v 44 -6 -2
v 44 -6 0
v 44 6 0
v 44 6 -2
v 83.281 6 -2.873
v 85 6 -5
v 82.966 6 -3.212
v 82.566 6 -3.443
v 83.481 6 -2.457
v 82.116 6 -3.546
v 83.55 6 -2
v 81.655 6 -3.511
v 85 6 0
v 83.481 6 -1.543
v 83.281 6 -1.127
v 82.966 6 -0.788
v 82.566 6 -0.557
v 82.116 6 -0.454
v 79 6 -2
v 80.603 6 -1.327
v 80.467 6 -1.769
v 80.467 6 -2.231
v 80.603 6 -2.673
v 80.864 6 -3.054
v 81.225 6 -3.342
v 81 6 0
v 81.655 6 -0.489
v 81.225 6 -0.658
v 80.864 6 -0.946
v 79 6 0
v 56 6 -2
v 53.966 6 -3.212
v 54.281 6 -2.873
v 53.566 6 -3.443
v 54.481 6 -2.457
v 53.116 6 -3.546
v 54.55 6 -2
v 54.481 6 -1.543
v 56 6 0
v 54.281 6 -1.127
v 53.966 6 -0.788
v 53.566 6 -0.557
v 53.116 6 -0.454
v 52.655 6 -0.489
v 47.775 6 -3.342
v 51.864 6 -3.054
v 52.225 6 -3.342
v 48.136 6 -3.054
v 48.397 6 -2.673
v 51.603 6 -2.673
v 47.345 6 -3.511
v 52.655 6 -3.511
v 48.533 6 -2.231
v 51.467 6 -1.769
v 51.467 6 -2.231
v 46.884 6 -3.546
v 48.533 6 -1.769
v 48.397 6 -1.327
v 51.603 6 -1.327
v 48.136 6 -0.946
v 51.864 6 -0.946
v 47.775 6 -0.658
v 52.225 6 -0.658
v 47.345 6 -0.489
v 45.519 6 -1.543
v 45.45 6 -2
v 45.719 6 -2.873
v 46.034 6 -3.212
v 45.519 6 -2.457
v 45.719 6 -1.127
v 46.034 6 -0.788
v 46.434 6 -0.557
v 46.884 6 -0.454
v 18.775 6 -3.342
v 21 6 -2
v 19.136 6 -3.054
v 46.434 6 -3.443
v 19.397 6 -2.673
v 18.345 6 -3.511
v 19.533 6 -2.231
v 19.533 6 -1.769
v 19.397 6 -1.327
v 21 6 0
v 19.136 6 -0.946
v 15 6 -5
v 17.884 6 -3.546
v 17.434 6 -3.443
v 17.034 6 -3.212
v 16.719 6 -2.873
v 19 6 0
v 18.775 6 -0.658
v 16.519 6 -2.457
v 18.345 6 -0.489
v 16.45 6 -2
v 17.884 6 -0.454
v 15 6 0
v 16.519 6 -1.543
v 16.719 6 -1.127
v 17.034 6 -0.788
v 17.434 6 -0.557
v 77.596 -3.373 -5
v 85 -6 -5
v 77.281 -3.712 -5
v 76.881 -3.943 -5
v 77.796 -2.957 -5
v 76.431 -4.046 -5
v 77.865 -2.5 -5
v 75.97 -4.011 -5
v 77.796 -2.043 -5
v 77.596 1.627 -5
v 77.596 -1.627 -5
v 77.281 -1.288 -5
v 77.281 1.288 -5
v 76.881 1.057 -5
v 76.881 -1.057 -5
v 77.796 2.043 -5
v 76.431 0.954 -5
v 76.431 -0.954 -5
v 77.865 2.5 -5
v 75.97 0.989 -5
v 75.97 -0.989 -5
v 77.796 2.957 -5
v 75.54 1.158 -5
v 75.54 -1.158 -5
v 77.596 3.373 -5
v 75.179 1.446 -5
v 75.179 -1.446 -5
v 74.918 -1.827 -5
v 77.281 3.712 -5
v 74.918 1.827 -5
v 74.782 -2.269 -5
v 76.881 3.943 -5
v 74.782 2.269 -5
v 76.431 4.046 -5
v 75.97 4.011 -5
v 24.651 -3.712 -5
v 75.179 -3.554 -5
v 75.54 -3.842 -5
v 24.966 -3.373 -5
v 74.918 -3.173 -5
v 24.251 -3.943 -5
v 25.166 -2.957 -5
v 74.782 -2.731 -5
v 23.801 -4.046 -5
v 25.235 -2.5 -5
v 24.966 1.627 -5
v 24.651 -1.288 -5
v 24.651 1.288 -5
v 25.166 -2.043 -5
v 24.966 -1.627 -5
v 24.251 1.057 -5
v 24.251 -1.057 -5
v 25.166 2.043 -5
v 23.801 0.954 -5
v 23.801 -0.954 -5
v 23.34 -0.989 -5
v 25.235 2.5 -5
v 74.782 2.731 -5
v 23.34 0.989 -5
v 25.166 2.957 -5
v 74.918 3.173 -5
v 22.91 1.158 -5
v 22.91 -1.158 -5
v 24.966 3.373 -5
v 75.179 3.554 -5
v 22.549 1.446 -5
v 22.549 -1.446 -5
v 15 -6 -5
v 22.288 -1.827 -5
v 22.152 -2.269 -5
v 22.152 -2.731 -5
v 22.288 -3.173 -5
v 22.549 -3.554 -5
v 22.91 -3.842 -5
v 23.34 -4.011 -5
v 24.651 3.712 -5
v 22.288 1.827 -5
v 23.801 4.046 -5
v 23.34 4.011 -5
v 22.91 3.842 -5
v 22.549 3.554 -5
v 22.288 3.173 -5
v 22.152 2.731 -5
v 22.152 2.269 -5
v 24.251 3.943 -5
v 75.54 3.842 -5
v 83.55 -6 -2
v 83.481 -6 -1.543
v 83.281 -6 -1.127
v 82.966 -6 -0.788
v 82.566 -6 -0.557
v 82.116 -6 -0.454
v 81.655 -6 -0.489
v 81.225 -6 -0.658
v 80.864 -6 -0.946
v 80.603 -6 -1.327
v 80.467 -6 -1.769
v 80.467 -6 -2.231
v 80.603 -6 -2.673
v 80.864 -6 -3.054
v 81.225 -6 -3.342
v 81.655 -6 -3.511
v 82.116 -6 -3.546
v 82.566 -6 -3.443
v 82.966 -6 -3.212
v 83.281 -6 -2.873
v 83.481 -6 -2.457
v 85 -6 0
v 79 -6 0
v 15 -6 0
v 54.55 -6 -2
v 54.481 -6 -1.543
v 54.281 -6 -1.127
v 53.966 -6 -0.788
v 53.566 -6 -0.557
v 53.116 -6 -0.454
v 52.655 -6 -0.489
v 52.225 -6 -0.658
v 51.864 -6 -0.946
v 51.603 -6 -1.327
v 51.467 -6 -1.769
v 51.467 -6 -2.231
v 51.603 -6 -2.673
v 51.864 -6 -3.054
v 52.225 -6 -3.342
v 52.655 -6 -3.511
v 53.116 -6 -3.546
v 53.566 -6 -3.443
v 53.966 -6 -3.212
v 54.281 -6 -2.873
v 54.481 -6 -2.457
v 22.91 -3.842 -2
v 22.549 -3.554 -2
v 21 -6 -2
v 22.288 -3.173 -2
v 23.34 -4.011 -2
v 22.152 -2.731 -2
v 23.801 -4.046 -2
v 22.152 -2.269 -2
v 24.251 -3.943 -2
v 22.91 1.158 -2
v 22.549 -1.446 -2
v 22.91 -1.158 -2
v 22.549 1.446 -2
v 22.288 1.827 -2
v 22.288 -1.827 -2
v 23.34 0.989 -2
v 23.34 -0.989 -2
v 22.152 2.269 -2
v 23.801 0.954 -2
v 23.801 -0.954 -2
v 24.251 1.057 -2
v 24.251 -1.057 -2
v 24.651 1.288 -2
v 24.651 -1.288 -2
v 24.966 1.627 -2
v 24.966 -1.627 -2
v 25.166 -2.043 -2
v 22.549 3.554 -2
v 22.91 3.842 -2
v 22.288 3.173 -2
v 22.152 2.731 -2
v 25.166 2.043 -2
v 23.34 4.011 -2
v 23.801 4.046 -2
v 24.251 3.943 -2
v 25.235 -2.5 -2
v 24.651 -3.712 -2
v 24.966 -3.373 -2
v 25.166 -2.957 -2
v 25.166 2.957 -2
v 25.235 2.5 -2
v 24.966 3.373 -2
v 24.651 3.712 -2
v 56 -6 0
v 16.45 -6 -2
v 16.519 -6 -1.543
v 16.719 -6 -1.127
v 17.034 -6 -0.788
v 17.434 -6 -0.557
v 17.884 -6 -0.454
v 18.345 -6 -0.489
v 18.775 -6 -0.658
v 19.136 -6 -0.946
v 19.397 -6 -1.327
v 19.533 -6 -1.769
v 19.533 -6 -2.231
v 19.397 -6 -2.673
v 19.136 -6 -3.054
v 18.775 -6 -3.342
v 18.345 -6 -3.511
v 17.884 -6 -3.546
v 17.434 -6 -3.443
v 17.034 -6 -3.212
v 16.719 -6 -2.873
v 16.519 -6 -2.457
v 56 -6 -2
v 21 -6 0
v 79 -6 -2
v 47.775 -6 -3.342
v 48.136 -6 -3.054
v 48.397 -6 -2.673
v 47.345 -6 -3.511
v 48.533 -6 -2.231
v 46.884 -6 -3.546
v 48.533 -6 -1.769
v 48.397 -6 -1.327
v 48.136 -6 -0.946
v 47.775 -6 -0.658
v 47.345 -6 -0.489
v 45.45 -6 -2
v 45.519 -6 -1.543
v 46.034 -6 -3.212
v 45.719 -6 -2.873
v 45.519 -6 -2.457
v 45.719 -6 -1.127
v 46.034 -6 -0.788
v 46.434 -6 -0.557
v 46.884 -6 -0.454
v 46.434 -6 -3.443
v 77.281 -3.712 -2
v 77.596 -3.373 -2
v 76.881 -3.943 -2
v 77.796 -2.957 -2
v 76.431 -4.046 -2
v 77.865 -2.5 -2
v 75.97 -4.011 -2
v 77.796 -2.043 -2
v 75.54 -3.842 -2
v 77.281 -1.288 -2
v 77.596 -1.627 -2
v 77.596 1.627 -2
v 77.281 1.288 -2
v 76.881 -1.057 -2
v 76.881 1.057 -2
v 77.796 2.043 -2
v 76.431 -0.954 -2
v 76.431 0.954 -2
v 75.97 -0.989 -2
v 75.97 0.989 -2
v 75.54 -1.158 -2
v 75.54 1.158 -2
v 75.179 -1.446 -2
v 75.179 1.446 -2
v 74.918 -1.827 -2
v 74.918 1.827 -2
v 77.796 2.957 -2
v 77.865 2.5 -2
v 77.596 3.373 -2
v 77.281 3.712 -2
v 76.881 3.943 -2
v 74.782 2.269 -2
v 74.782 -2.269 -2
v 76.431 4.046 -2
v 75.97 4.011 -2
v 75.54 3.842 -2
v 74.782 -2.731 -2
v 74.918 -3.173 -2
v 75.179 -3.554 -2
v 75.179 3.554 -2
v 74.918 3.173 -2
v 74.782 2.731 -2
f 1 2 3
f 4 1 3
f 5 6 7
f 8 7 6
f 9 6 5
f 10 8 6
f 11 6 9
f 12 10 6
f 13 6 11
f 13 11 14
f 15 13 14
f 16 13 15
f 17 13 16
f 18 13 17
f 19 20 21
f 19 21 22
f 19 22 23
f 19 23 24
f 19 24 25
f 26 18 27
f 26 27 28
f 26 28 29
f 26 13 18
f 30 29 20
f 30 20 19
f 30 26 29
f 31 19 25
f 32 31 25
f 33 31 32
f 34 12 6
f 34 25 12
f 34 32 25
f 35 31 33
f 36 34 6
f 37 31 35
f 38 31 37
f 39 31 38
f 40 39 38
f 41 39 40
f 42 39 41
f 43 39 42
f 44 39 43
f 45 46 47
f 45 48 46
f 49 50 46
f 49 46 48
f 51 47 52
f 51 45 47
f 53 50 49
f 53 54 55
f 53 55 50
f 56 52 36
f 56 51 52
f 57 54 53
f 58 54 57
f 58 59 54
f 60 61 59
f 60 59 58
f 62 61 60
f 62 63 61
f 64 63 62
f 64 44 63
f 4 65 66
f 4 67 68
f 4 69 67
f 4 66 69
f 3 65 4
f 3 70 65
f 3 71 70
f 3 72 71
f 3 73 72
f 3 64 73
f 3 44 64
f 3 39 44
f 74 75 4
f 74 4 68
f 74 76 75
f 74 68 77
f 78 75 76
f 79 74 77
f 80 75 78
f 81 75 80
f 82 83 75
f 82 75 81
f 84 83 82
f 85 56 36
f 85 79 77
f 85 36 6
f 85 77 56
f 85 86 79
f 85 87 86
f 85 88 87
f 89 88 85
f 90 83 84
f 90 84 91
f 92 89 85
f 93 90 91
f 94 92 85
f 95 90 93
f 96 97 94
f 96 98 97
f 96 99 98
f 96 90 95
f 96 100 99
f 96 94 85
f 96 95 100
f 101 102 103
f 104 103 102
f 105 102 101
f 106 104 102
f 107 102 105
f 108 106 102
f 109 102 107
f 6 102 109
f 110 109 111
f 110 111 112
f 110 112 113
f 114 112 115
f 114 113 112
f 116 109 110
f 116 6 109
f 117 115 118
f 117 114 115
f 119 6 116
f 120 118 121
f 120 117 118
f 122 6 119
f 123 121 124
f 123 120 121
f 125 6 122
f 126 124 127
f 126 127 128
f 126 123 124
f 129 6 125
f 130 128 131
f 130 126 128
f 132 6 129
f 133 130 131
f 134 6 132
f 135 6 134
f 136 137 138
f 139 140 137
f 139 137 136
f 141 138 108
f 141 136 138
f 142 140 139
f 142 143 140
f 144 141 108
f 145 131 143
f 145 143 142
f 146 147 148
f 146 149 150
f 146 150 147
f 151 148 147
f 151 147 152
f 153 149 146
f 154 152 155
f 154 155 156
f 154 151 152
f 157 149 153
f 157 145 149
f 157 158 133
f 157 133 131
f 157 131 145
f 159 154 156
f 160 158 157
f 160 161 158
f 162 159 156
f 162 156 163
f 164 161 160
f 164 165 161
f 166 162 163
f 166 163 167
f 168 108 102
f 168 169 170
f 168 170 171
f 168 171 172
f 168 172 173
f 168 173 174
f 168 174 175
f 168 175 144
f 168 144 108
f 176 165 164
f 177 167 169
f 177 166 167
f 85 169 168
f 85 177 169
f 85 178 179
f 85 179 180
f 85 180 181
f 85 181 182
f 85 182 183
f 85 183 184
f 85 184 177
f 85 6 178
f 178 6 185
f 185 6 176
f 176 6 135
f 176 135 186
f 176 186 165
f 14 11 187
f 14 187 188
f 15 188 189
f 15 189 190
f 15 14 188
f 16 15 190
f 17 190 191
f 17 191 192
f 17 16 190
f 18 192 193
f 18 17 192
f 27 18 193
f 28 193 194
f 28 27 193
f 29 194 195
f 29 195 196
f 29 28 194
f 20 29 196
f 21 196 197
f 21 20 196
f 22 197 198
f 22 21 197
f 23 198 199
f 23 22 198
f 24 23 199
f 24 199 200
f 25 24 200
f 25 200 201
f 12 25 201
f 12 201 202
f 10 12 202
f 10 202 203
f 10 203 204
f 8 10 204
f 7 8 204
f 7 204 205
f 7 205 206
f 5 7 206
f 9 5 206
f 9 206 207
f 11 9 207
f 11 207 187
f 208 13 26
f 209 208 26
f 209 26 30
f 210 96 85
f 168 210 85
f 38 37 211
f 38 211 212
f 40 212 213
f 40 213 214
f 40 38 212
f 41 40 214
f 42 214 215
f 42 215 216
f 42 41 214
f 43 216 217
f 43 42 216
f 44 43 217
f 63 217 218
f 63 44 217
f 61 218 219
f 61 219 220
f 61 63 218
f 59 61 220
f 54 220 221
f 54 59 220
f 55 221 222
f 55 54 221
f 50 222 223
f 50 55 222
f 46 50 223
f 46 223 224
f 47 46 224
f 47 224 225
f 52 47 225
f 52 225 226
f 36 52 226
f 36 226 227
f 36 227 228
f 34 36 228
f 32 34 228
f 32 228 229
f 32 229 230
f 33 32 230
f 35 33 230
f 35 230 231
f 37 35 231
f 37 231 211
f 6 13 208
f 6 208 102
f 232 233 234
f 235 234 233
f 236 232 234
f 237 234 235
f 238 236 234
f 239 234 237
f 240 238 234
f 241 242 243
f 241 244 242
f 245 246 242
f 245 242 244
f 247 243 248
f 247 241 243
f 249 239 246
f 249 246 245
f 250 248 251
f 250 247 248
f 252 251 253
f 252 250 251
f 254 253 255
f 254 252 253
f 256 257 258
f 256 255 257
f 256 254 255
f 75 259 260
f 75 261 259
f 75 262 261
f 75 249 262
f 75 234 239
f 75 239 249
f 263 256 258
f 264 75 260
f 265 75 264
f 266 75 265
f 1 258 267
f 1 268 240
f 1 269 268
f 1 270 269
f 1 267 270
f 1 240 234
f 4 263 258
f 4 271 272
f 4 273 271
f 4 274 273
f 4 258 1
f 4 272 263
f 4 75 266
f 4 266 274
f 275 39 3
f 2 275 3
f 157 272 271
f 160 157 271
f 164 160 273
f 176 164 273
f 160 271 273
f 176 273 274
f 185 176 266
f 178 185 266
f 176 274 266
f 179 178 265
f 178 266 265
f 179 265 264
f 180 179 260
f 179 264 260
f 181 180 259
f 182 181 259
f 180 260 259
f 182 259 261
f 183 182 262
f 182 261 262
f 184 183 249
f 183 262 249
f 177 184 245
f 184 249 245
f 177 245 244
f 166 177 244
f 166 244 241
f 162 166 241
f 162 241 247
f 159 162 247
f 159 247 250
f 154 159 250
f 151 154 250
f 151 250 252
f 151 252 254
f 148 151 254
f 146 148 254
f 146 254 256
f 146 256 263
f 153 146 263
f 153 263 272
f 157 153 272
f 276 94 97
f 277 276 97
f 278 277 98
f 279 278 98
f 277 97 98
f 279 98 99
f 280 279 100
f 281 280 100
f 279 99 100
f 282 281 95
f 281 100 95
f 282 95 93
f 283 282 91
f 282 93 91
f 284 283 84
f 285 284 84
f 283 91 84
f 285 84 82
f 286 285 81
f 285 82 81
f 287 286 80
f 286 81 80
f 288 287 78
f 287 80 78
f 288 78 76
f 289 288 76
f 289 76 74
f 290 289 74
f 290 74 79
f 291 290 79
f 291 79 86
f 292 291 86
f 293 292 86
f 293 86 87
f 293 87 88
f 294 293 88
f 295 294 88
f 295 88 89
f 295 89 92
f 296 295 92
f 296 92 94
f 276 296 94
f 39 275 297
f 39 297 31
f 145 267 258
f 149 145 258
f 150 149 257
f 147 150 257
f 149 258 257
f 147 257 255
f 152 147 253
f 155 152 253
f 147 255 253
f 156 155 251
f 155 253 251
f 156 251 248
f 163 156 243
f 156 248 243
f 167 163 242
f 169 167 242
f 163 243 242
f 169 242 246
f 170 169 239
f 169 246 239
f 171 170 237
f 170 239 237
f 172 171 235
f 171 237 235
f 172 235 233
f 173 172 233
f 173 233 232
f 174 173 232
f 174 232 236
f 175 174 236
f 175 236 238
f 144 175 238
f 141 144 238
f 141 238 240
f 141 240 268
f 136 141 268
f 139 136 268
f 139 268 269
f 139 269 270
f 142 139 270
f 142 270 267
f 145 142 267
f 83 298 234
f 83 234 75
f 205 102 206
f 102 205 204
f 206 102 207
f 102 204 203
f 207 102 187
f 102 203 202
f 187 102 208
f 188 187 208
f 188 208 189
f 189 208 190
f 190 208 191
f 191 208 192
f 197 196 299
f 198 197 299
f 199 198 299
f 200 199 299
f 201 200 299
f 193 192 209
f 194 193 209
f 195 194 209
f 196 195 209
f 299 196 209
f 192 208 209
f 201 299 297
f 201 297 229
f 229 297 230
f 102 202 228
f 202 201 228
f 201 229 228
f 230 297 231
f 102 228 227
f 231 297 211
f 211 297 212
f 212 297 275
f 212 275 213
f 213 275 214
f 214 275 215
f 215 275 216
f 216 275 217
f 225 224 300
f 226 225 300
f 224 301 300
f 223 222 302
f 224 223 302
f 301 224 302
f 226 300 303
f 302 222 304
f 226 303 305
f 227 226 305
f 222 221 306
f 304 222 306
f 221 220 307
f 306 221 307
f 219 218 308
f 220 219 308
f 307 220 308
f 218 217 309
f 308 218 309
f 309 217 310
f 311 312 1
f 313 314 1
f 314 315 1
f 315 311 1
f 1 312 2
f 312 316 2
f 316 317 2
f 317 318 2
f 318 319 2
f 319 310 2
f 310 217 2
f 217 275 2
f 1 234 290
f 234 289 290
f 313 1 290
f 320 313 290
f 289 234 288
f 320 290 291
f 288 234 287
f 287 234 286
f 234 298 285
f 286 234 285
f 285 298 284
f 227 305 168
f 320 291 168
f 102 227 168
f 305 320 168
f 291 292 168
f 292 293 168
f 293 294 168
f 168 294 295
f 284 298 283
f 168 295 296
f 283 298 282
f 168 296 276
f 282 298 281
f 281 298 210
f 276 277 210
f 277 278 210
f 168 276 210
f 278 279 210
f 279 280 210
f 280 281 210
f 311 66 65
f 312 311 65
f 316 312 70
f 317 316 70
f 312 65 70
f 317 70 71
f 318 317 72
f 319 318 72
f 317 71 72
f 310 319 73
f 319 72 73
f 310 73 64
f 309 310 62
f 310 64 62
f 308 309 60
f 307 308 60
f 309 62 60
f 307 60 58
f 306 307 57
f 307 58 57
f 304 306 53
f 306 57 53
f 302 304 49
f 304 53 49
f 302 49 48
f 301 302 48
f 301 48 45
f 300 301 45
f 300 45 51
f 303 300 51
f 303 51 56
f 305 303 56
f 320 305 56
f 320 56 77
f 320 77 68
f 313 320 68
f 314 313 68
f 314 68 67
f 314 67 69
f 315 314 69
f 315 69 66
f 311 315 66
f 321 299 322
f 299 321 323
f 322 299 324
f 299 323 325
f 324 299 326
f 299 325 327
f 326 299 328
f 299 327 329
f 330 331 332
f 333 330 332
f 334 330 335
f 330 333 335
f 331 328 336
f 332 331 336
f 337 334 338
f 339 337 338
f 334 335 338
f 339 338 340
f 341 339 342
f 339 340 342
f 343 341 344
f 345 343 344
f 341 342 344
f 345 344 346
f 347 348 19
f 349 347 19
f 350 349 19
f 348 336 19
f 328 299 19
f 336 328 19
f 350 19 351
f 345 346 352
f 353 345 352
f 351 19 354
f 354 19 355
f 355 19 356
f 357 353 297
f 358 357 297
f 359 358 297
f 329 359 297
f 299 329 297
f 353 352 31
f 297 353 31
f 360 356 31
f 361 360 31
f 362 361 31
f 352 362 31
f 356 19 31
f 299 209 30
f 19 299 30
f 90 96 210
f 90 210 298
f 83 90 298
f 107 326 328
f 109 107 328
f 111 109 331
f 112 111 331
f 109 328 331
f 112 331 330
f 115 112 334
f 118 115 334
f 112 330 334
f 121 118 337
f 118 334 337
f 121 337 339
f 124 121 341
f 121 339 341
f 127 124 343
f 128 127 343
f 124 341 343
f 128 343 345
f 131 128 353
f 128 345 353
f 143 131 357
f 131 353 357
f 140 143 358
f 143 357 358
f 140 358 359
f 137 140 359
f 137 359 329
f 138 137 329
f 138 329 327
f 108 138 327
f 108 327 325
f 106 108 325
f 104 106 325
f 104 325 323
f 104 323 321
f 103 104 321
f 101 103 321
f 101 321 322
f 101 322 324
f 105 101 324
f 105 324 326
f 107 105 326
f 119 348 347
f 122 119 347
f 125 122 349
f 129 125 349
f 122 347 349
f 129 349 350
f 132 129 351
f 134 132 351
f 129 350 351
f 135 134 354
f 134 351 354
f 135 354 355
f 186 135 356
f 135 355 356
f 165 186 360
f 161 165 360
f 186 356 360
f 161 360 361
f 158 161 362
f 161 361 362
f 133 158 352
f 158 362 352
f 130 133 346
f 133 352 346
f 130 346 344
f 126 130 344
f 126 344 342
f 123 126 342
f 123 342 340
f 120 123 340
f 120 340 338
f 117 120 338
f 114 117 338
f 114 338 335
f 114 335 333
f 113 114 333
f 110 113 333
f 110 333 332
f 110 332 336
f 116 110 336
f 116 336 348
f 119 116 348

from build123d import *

# Parameters (mm, degrees)
SKETCH_1_W                = 100
SKETCH_1_H                = 12
SKETCH_1_R                = 1.75
EXTRUDE_1_DEPTH           = 5
EXTRUDE_2_DEPTH           = 3
EXTRUDE_5_DEPTH           = 35
CUT_EXTRUDE_START         = -7
CUT_EXTRUDE_3_OUTLINE_R   = 1.75
CUT_EXTRUDE_3_DEPTH       = 14
SKETCH_19_W               = 65
SKETCH_19_H               = 12
CUT_EXTRUDE_7_DEPTH       = 10
CUT_EXTRUDE_8_DEPTH       = 10
SKETCH_21_R               = 1.75
CUT_EXTRUDE_9_DEPTH       = 25
FILLET_3_R                = 2
FILLET_4_R                = 1
FILLET_5_R                = 5
CUT_EXTRUDE_10_DEPTH      = 10
CUT_EXTRUDE_10_DEPTH_BACK = 20
SKETCH_22_W               = 69.035693394
SKETCH_22_H               = 99.85453556
SKETCH_24_W               = 23
SKETCH_24_H               = 12
CUT_EXTRUDE_11_DEPTH      = 2
SKETCH_25_R               = 1.55
CUT_EXTRUDE_12_DEPTH      = 17
SKETCH_27_R               = 1.75
EXTRUDE_7_DEPTH           = 3
SKETCH_28_R               = 1.55
CUT_EXTRUDE_13_DEPTH      = 11


# Read off the part's stored shape, not the designer's step: 切除-拉伸3
with BuildPart() as part:
    # 草图1 → 凸台-拉伸1 (new body)
    with BuildSketch(Plane.XY):
        Rectangle(SKETCH_1_W, SKETCH_1_H)
        with Locations((-26.315, 2.5)):
            Circle(SKETCH_1_R, mode=Mode.SUBTRACT)
        with Locations((-26.315, -2.5)):
            Circle(SKETCH_1_R, mode=Mode.SUBTRACT)
        with Locations((26.315, -2.5)):
            Circle(SKETCH_1_R, mode=Mode.SUBTRACT)
        with Locations((26.315, 2.5)):
            Circle(SKETCH_1_R, mode=Mode.SUBTRACT)
    extrude(amount=-EXTRUDE_1_DEPTH)

    # 草图2 → 凸台-拉伸2 (add)
    with BuildSketch(Plane(origin=(15, 0, 0), x_dir=(0, 0, -1), z_dir=(1, 0, 0))):
        Polygon((0, 6), (-92, 7), (-92, -7), (0, -6), align=None)
    extrude(amount=EXTRUDE_2_DEPTH)

    # 草图10 → 凸台-拉伸5 (add)
    with BuildSketch(Plane(origin=(18, 0, 0), x_dir=(0, 0, -1), z_dir=(1, 0, 0))):
        Polygon((-92, -3.999822784), (-92, -7), (0, -6), (0, -2.999822784), align=None)
        Polygon((-92, 7), (-92, 3.999822784), (0, 2.999822784), (0, 6), align=None)
    extrude(amount=EXTRUDE_5_DEPTH)

    # 切除-拉伸3 outline → 切除-拉伸3 (cut)
    with BuildSketch(Plane(origin=(0, 0, 0), x_dir=(1, 0, 0), z_dir=(0, 1, 0)).offset(CUT_EXTRUDE_START)):
        Polygon((29.145728922, -84.958399081), (31.382950186, -83.842674644), (15, -50.992014289), (15, -92), (32.657445151, -92), align=None)
        Polygon((42.101361871, -11.45542087), (17.526825547, -47.095951771), (33.361948293, -78.848122968), align=None)
        Polygon((40.711441699, -87.983392029), (32.657445151, -92), (53, -92), (53, 0), (50, 0), (44.585265539, -7.853007208), (34.962504207, -82.057515546), (37.199725471, -80.941791109), align=None)
        with Locations((19, -37.702345436)):
            Circle(CUT_EXTRUDE_3_OUTLINE_R)
        with BuildLine():
            Line((22.646536548, -32.624253352), (45.141316474, 0))
            Line((45.141316474, 0), (19, 0))
            Line((19, 0), (19, -31.488948372))
            ThreePointArc((19, -31.488948372), (20.405472076, -33.398539047), (22.646536548, -32.624253352))
        make_face()
    extrude(amount=CUT_EXTRUDE_3_DEPTH, mode=Mode.SUBTRACT)

    # 草图19 → 切除-拉伸7 (cut)
    with BuildSketch(Plane.XY):
        with Locations((-17.5, 0)):
            Rectangle(SKETCH_19_W, SKETCH_19_H)
    extrude(amount=-CUT_EXTRUDE_7_DEPTH, mode=Mode.SUBTRACT)

    # 草图20 → 切除-拉伸8 (cut)
    with BuildSketch(Plane.ZY.offset(-15)):
        Polygon((0, 2.999822784), (0, -2.999822784), (59.734349104, -3.649109187), (59.734349104, 3.649109187), align=None)
    extrude(amount=-CUT_EXTRUDE_8_DEPTH, mode=Mode.SUBTRACT)

    # 草图21 → 切除-拉伸9 (cut, symmetric)
    with BuildSketch(Plane(origin=(0, 0, 0.28540368), x_dir=(1, 0, 0), z_dir=(0, -1, 0))):
        with Locations(Location((35, 86.328690729, 0), (0, 0, 270))):
            Circle(SKETCH_21_R)
    extrude(amount=CUT_EXTRUDE_9_DEPTH, both=True, mode=Mode.SUBTRACT)

    # 圆角3
    # the kernel refuses this fillet: 2 mm, written as the material it adds along each edge
    with BuildSketch(Plane(origin=(31.382950186, -1.088843796, 83.842674644), x_dir=(-0.4462897746148819, 0, -0.8948885053872343), z_dir=(0, 1, 0))) as fillet_3_piece_1_section:
        with BuildLine():
            CenterArc((FILLET_3_R, FILLET_3_R), FILLET_3_R, 180.000000004, 89.999999996)
            Line((-FILLET_3_R * 7.06970432153e-11, FILLET_3_R), (-FILLET_3_R * 0.0200000000707, FILLET_3_R))
            Line((-FILLET_3_R * 0.0200000000707, FILLET_3_R), (-FILLET_3_R * 0.0199999999986, -FILLET_3_R * 0.02))
            Line((-FILLET_3_R * 0.0199999999986, -FILLET_3_R * 0.02), (FILLET_3_R, -FILLET_3_R * 0.02))
            Line((FILLET_3_R, -FILLET_3_R * 0.02), (FILLET_3_R, 0))
        make_face()
    fillet_3_piece_1 = extrude(amount=13.000177215, mode=Mode.PRIVATE)
    fillet_3_piece_1 = split(fillet_3_piece_1, bisect_by=Plane(origin=(30.775677766, 3.909125577, 83.655856907), z_dir=(0, 0.9999409315100345, -0.01086892316858714)), keep=Keep.TOP, mode=Mode.PRIVATE)
    fillet_3_piece_1 = split(fillet_3_piece_1, bisect_by=Plane(origin=(30.775677766, 6.908948371, 83.623250137), z_dir=(0, -0.9999409315100345, 0.010868923168587275)), keep=Keep.TOP, mode=Mode.PRIVATE)
    add(fillet_3_piece_1)
    with BuildSketch(Plane(origin=(31.382950186, -11.91133342, 83.842674644), x_dir=(-0.8948885053556793, 0, 0.44628977467815495), z_dir=(0, 1, 0))) as fillet_3_piece_2_section:
        with BuildLine():
            CenterArc((FILLET_3_R, -FILLET_3_R), FILLET_3_R, 90, 89.999999996)
            Line((-FILLET_3_R * 7.0703401566e-11, -FILLET_3_R), (-FILLET_3_R * 0.0200000000707, -FILLET_3_R))
            Line((-FILLET_3_R * 0.0200000000707, -FILLET_3_R), (-FILLET_3_R * 0.0199999999986, FILLET_3_R * 0.02))
            Line((-FILLET_3_R * 0.0199999999986, FILLET_3_R * 0.02), (FILLET_3_R, FILLET_3_R * 0.02))
            Line((FILLET_3_R, FILLET_3_R * 0.02), (FILLET_3_R, 0))
        make_face()
    fillet_3_piece_2 = extrude(amount=13.000177215, mode=Mode.PRIVATE)
    fillet_3_piece_2 = split(fillet_3_piece_2, bisect_by=Plane(origin=(30.775677766, -6.908948371, 83.623250137), z_dir=(0, 0.9999409315100345, 0.01086892316858739)), keep=Keep.TOP, mode=Mode.PRIVATE)
    fillet_3_piece_2 = split(fillet_3_piece_2, bisect_by=Plane(origin=(30.775677766, -3.909125577, 83.655856907), z_dir=(0, -0.9999409315100345, -0.010868923168587516)), keep=Keep.TOP, mode=Mode.PRIVATE)
    add(fillet_3_piece_2)
    with BuildSketch(Plane(origin=(17.526825547, -9.462581156, 47.095951771), x_dir=(0.4462897746085541, 0, 0.8948885053903899), z_dir=(0, 1, 0))) as fillet_3_piece_3_section:
        with BuildLine():
            CenterArc((FILLET_3_R * 0.590133727356, FILLET_3_R), FILLET_3_R, 208.907423837, 61.092576163)
            Line((-FILLET_3_R * 0.285268173202, FILLET_3_R * 0.516604186511), (-FILLET_3_R * 0.302776211214, FILLET_3_R * 0.506936270242))
            Line((-FILLET_3_R * 0.302776211214, FILLET_3_R * 0.506936270242), (-FILLET_3_R * 0.0118026745471, -FILLET_3_R * 0.02))
            Line((-FILLET_3_R * 0.0118026745471, -FILLET_3_R * 0.02), (FILLET_3_R * 0.590133727356, -FILLET_3_R * 0.02))
            Line((FILLET_3_R * 0.590133727356, -FILLET_3_R * 0.02), (FILLET_3_R * 0.590133727356, 0))
        make_face()
    fillet_3_piece_3 = extrude(amount=8.90151449, mode=Mode.PRIVATE)
    fillet_3_piece_3 = split(fillet_3_piece_3, bisect_by=Plane(origin=(17.786448955, -6.511934641, 47.097986993), z_dir=(0, 0.9999409315100345, 0.01086892316858739)), keep=Keep.TOP, mode=Mode.PRIVATE)
    fillet_3_piece_3 = split(fillet_3_piece_3, bisect_by=Plane(origin=(17.786448955, -3.512111847, 47.130593763), z_dir=(0, -0.9999409315100345, -0.010868923168587516)), keep=Keep.TOP, mode=Mode.PRIVATE)
    add(fillet_3_piece_3)
    with BuildSketch(Plane(origin=(34.962504207, -4.590143726, 82.057515546), x_dir=(0.8948885053556189, 0, -0.44628977467827596), z_dir=(0, 1, 0))) as fillet_3_piece_4_section:
        with BuildLine():
            CenterArc((3.552161927, 1.700868978), FILLET_3_R, 146.105291032, 92.153667276)
            Line((1.892034353, 2.816205895), (1.858831801, 2.838512633))
            Line((1.858831801, 2.838512633), (-0.033202551, 0.022306738))
            Line((-0.033202551, 0.022306738), (0, -0.04))
            ThreePointArc((0, -0.04), (1.25, -0.04), (2.478956762, -0.03401738))
            Line((2.478956762, -0.03401738), (2.500000001, 0))
        make_face()
    fillet_3_piece_4 = extrude(amount=19.96396927, mode=Mode.PRIVATE)
    fillet_3_piece_4 = split(fillet_3_piece_4, bisect_by=Plane(origin=(35.702859812, -3.878883458, 80.873581964), z_dir=(0, -0.9999409315100345, -0.010868923168587516)), keep=Keep.TOP, mode=Mode.PRIVATE)
    add(fillet_3_piece_4)
    with BuildSketch(Plane(origin=(34.962504207, -4.590143726, 82.057515546), x_dir=(0.8948885053556189, 0, -0.44628977467827596), z_dir=(0, 1, 0))) as fillet_3_piece_5_section:
        with BuildLine():
            CenterArc((3.552161927, 1.700868978), FILLET_3_R, 146.105291032, 92.153667276)
            Line((1.892034353, 2.816205895), (1.858831801, 2.838512633))
            Line((1.858831801, 2.838512633), (-0.033202551, 0.022306738))
            Line((-0.033202551, 0.022306738), (0, -0.04))
            ThreePointArc((0, -0.04), (1.25, -0.04), (2.478956762, -0.03401738))
            Line((2.478956762, -0.03401738), (2.500000001, 0))
        make_face()
    fillet_3_piece_5 = extrude(amount=19.96396927, mode=Mode.PRIVATE)
    fillet_3_piece_5 = split(fillet_3_piece_5, bisect_by=Plane(origin=(35.703261473, 3.879081131, 80.891767963), z_dir=(0, 0.9999409315100345, -0.01086892316858714)), keep=Keep.TOP, mode=Mode.PRIVATE)
    fillet_3_piece_5 = split(fillet_3_piece_5, bisect_by=Plane(origin=(35.703261473, 6.878903926, 80.859161193), z_dir=(0, -0.9999409315100345, 0.010868923168587275)), keep=Keep.TOP, mode=Mode.PRIVATE)
    add(fillet_3_piece_5)
    with BuildSketch(Plane(origin=(34.962504207, -15.373825544, 82.057515546), x_dir=(0.8948885053556189, 0, -0.44628977467827596), z_dir=(0, 1, 0))) as fillet_3_piece_6_section:
        with BuildLine():
            CenterArc((3.552161927, 1.700868978), FILLET_3_R, 146.105291032, 92.153667276)
            Line((1.892034353, 2.816205895), (1.858831801, 2.838512633))
            Line((1.858831801, 2.838512633), (-0.033202551, 0.022306738))
            Line((-0.033202551, 0.022306738), (0, -0.04))
            ThreePointArc((0, -0.04), (1.25, -0.04), (2.478956762, -0.03401738))
            Line((2.478956762, -0.03401738), (2.500000001, 0))
        make_face()
    fillet_3_piece_6 = extrude(amount=19.96396927, mode=Mode.PRIVATE)
    fillet_3_piece_6 = split(fillet_3_piece_6, bisect_by=Plane(origin=(35.703261473, -6.878903926, 80.859161193), z_dir=(0, 0.9999409315100345, 0.01086892316858739)), keep=Keep.TOP, mode=Mode.PRIVATE)
    fillet_3_piece_6 = split(fillet_3_piece_6, bisect_by=Plane(origin=(35.703261473, -3.879081131, 80.891767963), z_dir=(0, -0.9999409315100345, -0.010868923168587516)), keep=Keep.TOP, mode=Mode.PRIVATE)
    add(fillet_3_piece_6)
    with BuildSketch(Plane(origin=(34.962504207, -15.373825544, 82.057515546), x_dir=(0.8948885053556189, 0, -0.44628977467827596), z_dir=(0, 1, 0))) as fillet_3_piece_7_section:
        with BuildLine():
            CenterArc((3.552161927, 1.700868978), FILLET_3_R, 146.105291032, 92.153667276)
            Line((1.892034353, 2.816205895), (1.858831801, 2.838512633))
            Line((1.858831801, 2.838512633), (-0.033202551, 0.022306738))
            Line((-0.033202551, 0.022306738), (0, -0.04))
            ThreePointArc((0, -0.04), (1.25, -0.04), (2.478956762, -0.03401738))
            Line((2.478956762, -0.03401738), (2.500000001, 0))
        make_face()
    fillet_3_piece_7 = extrude(amount=19.96396927, mode=Mode.PRIVATE)
    fillet_3_piece_7 = split(fillet_3_piece_7, bisect_by=Plane(origin=(35.702859812, 3.878883458, 80.873581964), z_dir=(0, 0.9999409315100345, -0.01086892316858714)), keep=Keep.TOP, mode=Mode.PRIVATE)
    add(fillet_3_piece_7)
    with BuildSketch(Plane(origin=(17.526825547, 0.561066667, 47.095951771), x_dir=(0.4462897746085541, 0, 0.8948885053903899), z_dir=(0, 1, 0))) as fillet_3_piece_8_section:
        with BuildLine():
            CenterArc((FILLET_3_R * 0.590133727356, FILLET_3_R), FILLET_3_R, 208.907423837, 61.092576163)
            Line((-FILLET_3_R * 0.285268173202, FILLET_3_R * 0.516604186511), (-FILLET_3_R * 0.302776211214, FILLET_3_R * 0.506936270242))
            Line((-FILLET_3_R * 0.302776211214, FILLET_3_R * 0.506936270242), (-FILLET_3_R * 0.0118026745471, -FILLET_3_R * 0.02))
            Line((-FILLET_3_R * 0.0118026745471, -FILLET_3_R * 0.02), (FILLET_3_R * 0.590133727356, -FILLET_3_R * 0.02))
            Line((FILLET_3_R * 0.590133727356, -FILLET_3_R * 0.02), (FILLET_3_R * 0.590133727356, 0))
        make_face()
    fillet_3_piece_8 = extrude(amount=8.90151449, mode=Mode.PRIVATE)
    fillet_3_piece_8 = split(fillet_3_piece_8, bisect_by=Plane(origin=(17.786448955, 3.512111847, 47.130593763), z_dir=(0, 0.9999409315100345, -0.01086892316858714)), keep=Keep.TOP, mode=Mode.PRIVATE)
    fillet_3_piece_8 = split(fillet_3_piece_8, bisect_by=Plane(origin=(17.786448955, 6.511934641, 47.097986993), z_dir=(0, -0.9999409315100345, 0.010868923168587275)), keep=Keep.TOP, mode=Mode.PRIVATE)
    add(fillet_3_piece_8)
    with BuildSketch(Plane(origin=(19, -11, 0), x_dir=(1, 0, 0), z_dir=(0, 1, 0))) as fillet_3_piece_9_section:
        with BuildLine():
            CenterArc((FILLET_3_R, -FILLET_3_R), FILLET_3_R, 90, 90)
            Line((0, -FILLET_3_R), (-FILLET_3_R * 0.02, -FILLET_3_R))
            Line((-FILLET_3_R * 0.02, -FILLET_3_R), (-FILLET_3_R * 0.02, FILLET_3_R * 0.02))
            Line((-FILLET_3_R * 0.02, FILLET_3_R * 0.02), (FILLET_3_R, FILLET_3_R * 0.02))
            Line((FILLET_3_R, FILLET_3_R * 0.02), (FILLET_3_R, 0))
        make_face()
    fillet_3_piece_9 = extrude(amount=13.000177216, mode=Mode.PRIVATE)
    fillet_3_piece_9 = split(fillet_3_piece_9, bisect_by=Plane(origin=(19.212945359, -6, 0.86023594), z_dir=(0, -1, 0)), keep=Keep.TOP, mode=Mode.PRIVATE)
    fillet_3_piece_9 = split(fillet_3_piece_9, bisect_by=Plane(origin=(19.212945359, -6.009349838, 0.860185129), z_dir=(0, 0.9999409315100345, 0.01086892316858739)), keep=Keep.TOP, mode=Mode.PRIVATE)
    add(fillet_3_piece_9)
    with BuildSketch(Plane(origin=(19, -6, 0), x_dir=(1, 0, 0), z_dir=(0, 1, 0))) as fillet_3_piece_10_section:
        with BuildLine():
            CenterArc((FILLET_3_R, -FILLET_3_R), FILLET_3_R, 90, 90)
            Line((0, -FILLET_3_R), (-FILLET_3_R * 0.02, -FILLET_3_R))
            Line((-FILLET_3_R * 0.02, -FILLET_3_R), (-FILLET_3_R * 0.02, FILLET_3_R * 0.02))
            Line((-FILLET_3_R * 0.02, FILLET_3_R * 0.02), (FILLET_3_R, FILLET_3_R * 0.02))
            Line((FILLET_3_R, FILLET_3_R * 0.02), (FILLET_3_R, 0))
        make_face()
    fillet_3_piece_10 = extrude(amount=8.000177216, mode=Mode.PRIVATE)
    fillet_3_piece_10 = split(fillet_3_piece_10, bisect_by=Plane(origin=(19.453185723, -3.004914034, 0.468394952), z_dir=(0, -0.9999409315100345, -0.010868923168587516)), keep=Keep.TOP, mode=Mode.PRIVATE)
    add(fillet_3_piece_10)
    with BuildSketch(Plane(origin=(19, -6, 0), x_dir=(1, 0, 0), z_dir=(0, 1, 0))) as fillet_3_piece_11_section:
        with BuildLine():
            CenterArc((FILLET_3_R, -FILLET_3_R), FILLET_3_R, 90, 90)
            Line((0, -FILLET_3_R), (-FILLET_3_R * 0.02, -FILLET_3_R))
            Line((-FILLET_3_R * 0.02, -FILLET_3_R), (-FILLET_3_R * 0.02, FILLET_3_R * 0.02))
            Line((-FILLET_3_R * 0.02, FILLET_3_R * 0.02), (FILLET_3_R, FILLET_3_R * 0.02))
            Line((FILLET_3_R, FILLET_3_R * 0.02), (FILLET_3_R, 0))
        make_face()
    fillet_3_piece_11 = extrude(amount=8.000177216, mode=Mode.PRIVATE)
    fillet_3_piece_11 = split(fillet_3_piece_11, bisect_by=Plane(origin=(19.98, -5.999710162, -0.026665092), z_dir=(0, -0.9999409315100345, -0.01086892316858739)), keep=Keep.TOP, mode=Mode.PRIVATE)
    add(fillet_3_piece_11)
    with BuildSketch(Plane(origin=(19, -2.000177216, 0), x_dir=(1, 0, 0), z_dir=(0, 1, 0))) as fillet_3_piece_12_section:
        with BuildLine():
            CenterArc((FILLET_3_R, -FILLET_3_R), FILLET_3_R, 90, 90)
            Line((0, -FILLET_3_R), (-FILLET_3_R * 0.02, -FILLET_3_R))
            Line((-FILLET_3_R * 0.02, -FILLET_3_R), (-FILLET_3_R * 0.02, FILLET_3_R * 0.02))
            Line((-FILLET_3_R * 0.02, FILLET_3_R * 0.02), (FILLET_3_R, FILLET_3_R * 0.02))
            Line((FILLET_3_R, FILLET_3_R * 0.02), (FILLET_3_R, 0))
        make_face()
    fillet_3_piece_12 = extrude(amount=8.000177216, mode=Mode.PRIVATE)
    fillet_3_piece_12 = split(fillet_3_piece_12, bisect_by=Plane(origin=(19.453185723, 3.004914034, 0.468394952), z_dir=(0, 0.9999409315100345, -0.01086892316858714)), keep=Keep.TOP, mode=Mode.PRIVATE)
    add(fillet_3_piece_12)
    with BuildSketch(Plane(origin=(19, -2.000177216, 0), x_dir=(1, 0, 0), z_dir=(0, 1, 0))) as fillet_3_piece_13_section:
        with BuildLine():
            CenterArc((FILLET_3_R, -FILLET_3_R), FILLET_3_R, 90, 90)
            Line((0, -FILLET_3_R), (-FILLET_3_R * 0.02, -FILLET_3_R))
            Line((-FILLET_3_R * 0.02, -FILLET_3_R), (-FILLET_3_R * 0.02, FILLET_3_R * 0.02))
            Line((-FILLET_3_R * 0.02, FILLET_3_R * 0.02), (FILLET_3_R, FILLET_3_R * 0.02))
            Line((FILLET_3_R, FILLET_3_R * 0.02), (FILLET_3_R, 0))
        make_face()
    fillet_3_piece_13 = extrude(amount=13.000177216, mode=Mode.PRIVATE)
    fillet_3_piece_13 = split(fillet_3_piece_13, bisect_by=Plane(origin=(19.212945359, 6, 0.86023594), z_dir=(0, 1, 0)), keep=Keep.TOP, mode=Mode.PRIVATE)
    fillet_3_piece_13 = split(fillet_3_piece_13, bisect_by=Plane(origin=(19.212945359, 6.009349838, 0.860185129), z_dir=(0, -0.9999409315100345, 0.010868923168587275)), keep=Keep.TOP, mode=Mode.PRIVATE)
    add(fillet_3_piece_13)
    with BuildSketch(Plane(origin=(19, -2.000177216, 0), x_dir=(1, 0, 0), z_dir=(0, 1, 0))) as fillet_3_piece_14_section:
        with BuildLine():
            CenterArc((FILLET_3_R, -FILLET_3_R), FILLET_3_R, 90, 90)
            Line((0, -FILLET_3_R), (-FILLET_3_R * 0.02, -FILLET_3_R))
            Line((-FILLET_3_R * 0.02, -FILLET_3_R), (-FILLET_3_R * 0.02, FILLET_3_R * 0.02))
            Line((-FILLET_3_R * 0.02, FILLET_3_R * 0.02), (FILLET_3_R, FILLET_3_R * 0.02))
            Line((FILLET_3_R, FILLET_3_R * 0.02), (FILLET_3_R, 0))
        make_face()
    fillet_3_piece_14 = extrude(amount=8.000177216, mode=Mode.PRIVATE)
    fillet_3_piece_14 = split(fillet_3_piece_14, bisect_by=Plane(origin=(19.98, 5.999710162, -0.026665092), z_dir=(0, 0.9999409315100345, -0.010868923168587275)), keep=Keep.TOP, mode=Mode.PRIVATE)
    add(fillet_3_piece_14)
    with BuildSketch(Plane(origin=(45.141316474, -6.521086374, 0), x_dir=(-1, 0, 0), z_dir=(0, 1, 0))) as fillet_3_piece_15_section:
        with BuildLine():
            CenterArc((FILLET_3_R * 1.90418183162, FILLET_3_R), FILLET_3_R, 145.413311576, 124.586688424)
            Line((FILLET_3_R * 1.08091355769, FILLET_3_R * 1.56765248977), (FILLET_3_R * 1.06444819221, FILLET_3_R * 1.57900553956))
            Line((FILLET_3_R * 1.06444819221, FILLET_3_R * 1.57900553956), (-FILLET_3_R * 0.0164653654786, FILLET_3_R * 0.0113530497954))
            Line((-FILLET_3_R * 0.0164653654786, FILLET_3_R * 0.0113530497954), (0, -FILLET_3_R * 0.02))
            Line((0, -FILLET_3_R * 0.02), (FILLET_3_R * 1.90418183162, -FILLET_3_R * 0.02))
            Line((FILLET_3_R * 1.90418183162, -FILLET_3_R * 0.02), (FILLET_3_R * 1.90418183162, 0))
        make_face()
    fillet_3_piece_15 = extrude(amount=12.521086374, mode=Mode.PRIVATE)
    fillet_3_piece_15 = split(fillet_3_piece_15, bisect_by=Plane(origin=(43.662831951, -6, 1.349647934), z_dir=(0, -1, 0)), keep=Keep.TOP, mode=Mode.PRIVATE)
    fillet_3_piece_15 = split(fillet_3_piece_15, bisect_by=Plane(origin=(43.662831951, -6.01466922, 1.349568214), z_dir=(0, 0.9999409315100345, 0.01086892316858739)), keep=Keep.TOP, mode=Mode.PRIVATE)
    add(fillet_3_piece_15)
    with BuildSketch(Plane(origin=(45.141316474, -6.521086374, 0), x_dir=(-1, 0, 0), z_dir=(0, 1, 0))) as fillet_3_piece_16_section:
        with BuildLine():
            CenterArc((FILLET_3_R * 1.90418183162, FILLET_3_R), FILLET_3_R, 145.413311576, 124.586688424)
            Line((FILLET_3_R * 1.08091355769, FILLET_3_R * 1.56765248977), (FILLET_3_R * 1.06444819221, FILLET_3_R * 1.57900553956))
            Line((FILLET_3_R * 1.06444819221, FILLET_3_R * 1.57900553956), (-FILLET_3_R * 0.0164653654786, FILLET_3_R * 0.0113530497954))
            Line((-FILLET_3_R * 0.0164653654786, FILLET_3_R * 0.0113530497954), (0, -FILLET_3_R * 0.02))
            Line((0, -FILLET_3_R * 0.02), (FILLET_3_R * 1.90418183162, -FILLET_3_R * 0.02))
            Line((FILLET_3_R * 1.90418183162, -FILLET_3_R * 0.02), (FILLET_3_R * 1.90418183162, 0))
        make_face()
    fillet_3_piece_16 = extrude(amount=12.521086374, mode=Mode.PRIVATE)
    fillet_3_piece_16 = split(fillet_3_piece_16, bisect_by=Plane(origin=(43.652851134, -6, 0.780052661), z_dir=(0, 1, 0)), keep=Keep.TOP, mode=Mode.PRIVATE)
    fillet_3_piece_16 = split(fillet_3_piece_16, bisect_by=Plane(origin=(43.652851134, -3.008478327, 0.79630992), z_dir=(0, -0.9999409315100345, -0.010868923168587516)), keep=Keep.TOP, mode=Mode.PRIVATE)
    add(fillet_3_piece_16)
    with BuildSketch(Plane(origin=(45.141316474, -6.521086374, 0), x_dir=(-1, 0, 0), z_dir=(0, 1, 0))) as fillet_3_piece_17_section:
        with BuildLine():
            CenterArc((FILLET_3_R * 1.90418183162, FILLET_3_R), FILLET_3_R, 145.413311576, 124.586688424)
            Line((FILLET_3_R * 1.08091355769, FILLET_3_R * 1.56765248977), (FILLET_3_R * 1.06444819221, FILLET_3_R * 1.57900553956))
            Line((FILLET_3_R * 1.06444819221, FILLET_3_R * 1.57900553956), (-FILLET_3_R * 0.0164653654786, FILLET_3_R * 0.0113530497954))
            Line((-FILLET_3_R * 0.0164653654786, FILLET_3_R * 0.0113530497954), (0, -FILLET_3_R * 0.02))
            Line((0, -FILLET_3_R * 0.02), (FILLET_3_R * 1.90418183162, -FILLET_3_R * 0.02))
            Line((FILLET_3_R * 1.90418183162, -FILLET_3_R * 0.02), (FILLET_3_R * 1.90418183162, 0))
        make_face()
    fillet_3_piece_17 = extrude(amount=12.521086374, mode=Mode.PRIVATE)
    fillet_3_piece_17 = split(fillet_3_piece_17, bisect_by=Plane(origin=(43.240638921, -6, -0.026654432), z_dir=(0, 1, 0)), keep=Keep.TOP, mode=Mode.PRIVATE)
    fillet_3_piece_17 = split(fillet_3_piece_17, bisect_by=Plane(origin=(43.240638921, -5.999710295, -0.026652857), z_dir=(0, -0.9999409315100345, -0.01086892316858739)), keep=Keep.TOP, mode=Mode.PRIVATE)
    add(fillet_3_piece_17)
    with BuildSketch(Plane(origin=(45.141316474, -6.521086374, 0), x_dir=(-1, 0, 0), z_dir=(0, 1, 0))) as fillet_3_piece_18_section:
        with BuildLine():
            CenterArc((FILLET_3_R * 1.90418183162, FILLET_3_R), FILLET_3_R, 145.413311576, 124.586688424)
            Line((FILLET_3_R * 1.08091355769, FILLET_3_R * 1.56765248977), (FILLET_3_R * 1.06444819221, FILLET_3_R * 1.57900553956))
            Line((FILLET_3_R * 1.06444819221, FILLET_3_R * 1.57900553956), (-FILLET_3_R * 0.0164653654786, FILLET_3_R * 0.0113530497954))
            Line((-FILLET_3_R * 0.0164653654786, FILLET_3_R * 0.0113530497954), (0, -FILLET_3_R * 0.02))
            Line((0, -FILLET_3_R * 0.02), (FILLET_3_R * 1.90418183162, -FILLET_3_R * 0.02))
            Line((FILLET_3_R * 1.90418183162, -FILLET_3_R * 0.02), (FILLET_3_R * 1.90418183162, 0))
        make_face()
    fillet_3_piece_18 = extrude(amount=12.521086374, mode=Mode.PRIVATE)
    fillet_3_piece_18 = split(fillet_3_piece_18, bisect_by=Plane(origin=(43.652851134, 3.008478327, 0.79630992), z_dir=(0, 0.9999409315100345, -0.01086892316858714)), keep=Keep.TOP, mode=Mode.PRIVATE)
    add(fillet_3_piece_18)
    with BuildSketch(Plane(origin=(45.141316474, -6.521086374, 0), x_dir=(-1, 0, 0), z_dir=(0, 1, 0))) as fillet_3_piece_19_section:
        with BuildLine():
            CenterArc((FILLET_3_R * 1.90418183162, FILLET_3_R), FILLET_3_R, 145.413311576, 124.586688424)
            Line((FILLET_3_R * 1.08091355769, FILLET_3_R * 1.56765248977), (FILLET_3_R * 1.06444819221, FILLET_3_R * 1.57900553956))
            Line((FILLET_3_R * 1.06444819221, FILLET_3_R * 1.57900553956), (-FILLET_3_R * 0.0164653654786, FILLET_3_R * 0.0113530497954))
            Line((-FILLET_3_R * 0.0164653654786, FILLET_3_R * 0.0113530497954), (0, -FILLET_3_R * 0.02))
            Line((0, -FILLET_3_R * 0.02), (FILLET_3_R * 1.90418183162, -FILLET_3_R * 0.02))
            Line((FILLET_3_R * 1.90418183162, -FILLET_3_R * 0.02), (FILLET_3_R * 1.90418183162, 0))
        make_face()
    fillet_3_piece_19 = extrude(amount=22.041995532, mode=Mode.PRIVATE)
    fillet_3_piece_19 = split(fillet_3_piece_19, bisect_by=Plane(origin=(43.662831951, 6, 1.349647934), z_dir=(0, 1, 0)), keep=Keep.TOP, mode=Mode.PRIVATE)
    fillet_3_piece_19 = split(fillet_3_piece_19, bisect_by=Plane(origin=(43.662831951, 6.01466922, 1.349568214), z_dir=(0, -0.9999409315100345, 0.010868923168587275)), keep=Keep.TOP, mode=Mode.PRIVATE)
    add(fillet_3_piece_19)
    with BuildSketch(Plane(origin=(45.141316474, -6.521086374, 0), x_dir=(-1, 0, 0), z_dir=(0, 1, 0))) as fillet_3_piece_20_section:
        with BuildLine():
            CenterArc((FILLET_3_R * 1.90418183162, FILLET_3_R), FILLET_3_R, 145.413311576, 124.586688424)
            Line((FILLET_3_R * 1.08091355769, FILLET_3_R * 1.56765248977), (FILLET_3_R * 1.06444819221, FILLET_3_R * 1.57900553956))
            Line((FILLET_3_R * 1.06444819221, FILLET_3_R * 1.57900553956), (-FILLET_3_R * 0.0164653654786, FILLET_3_R * 0.0113530497954))
            Line((-FILLET_3_R * 0.0164653654786, FILLET_3_R * 0.0113530497954), (0, -FILLET_3_R * 0.02))
            Line((0, -FILLET_3_R * 0.02), (FILLET_3_R * 1.90418183162, -FILLET_3_R * 0.02))
            Line((FILLET_3_R * 1.90418183162, -FILLET_3_R * 0.02), (FILLET_3_R * 1.90418183162, 0))
        make_face()
    fillet_3_piece_20 = extrude(amount=12.521086374, mode=Mode.PRIVATE)
    fillet_3_piece_20 = split(fillet_3_piece_20, bisect_by=Plane(origin=(43.240638921, 5.999710295, -0.026652857), z_dir=(0, 0.9999409315100345, -0.010868923168587275)), keep=Keep.TOP, mode=Mode.PRIVATE)
    add(fillet_3_piece_20)
    with BuildSketch(Plane(origin=(45.141316474, -15.520909158, 0), x_dir=(-1, 0, 0), z_dir=(0, 1, 0))) as fillet_3_piece_21_section:
        with BuildLine():
            CenterArc((FILLET_3_R * 1.90418183162, FILLET_3_R), FILLET_3_R, 145.413311576, 124.586688424)
            Line((FILLET_3_R * 1.08091355769, FILLET_3_R * 1.56765248977), (FILLET_3_R * 1.06444819221, FILLET_3_R * 1.57900553956))
            Line((FILLET_3_R * 1.06444819221, FILLET_3_R * 1.57900553956), (-FILLET_3_R * 0.0164653654786, FILLET_3_R * 0.0113530497954))
            Line((-FILLET_3_R * 0.0164653654786, FILLET_3_R * 0.0113530497954), (0, -FILLET_3_R * 0.02))
            Line((0, -FILLET_3_R * 0.02), (FILLET_3_R * 1.90418183162, -FILLET_3_R * 0.02))
            Line((FILLET_3_R * 1.90418183162, -FILLET_3_R * 0.02), (FILLET_3_R * 1.90418183162, 0))
        make_face()
    fillet_3_piece_21 = extrude(amount=22.041995532, mode=Mode.PRIVATE)
    fillet_3_piece_21 = split(fillet_3_piece_21, bisect_by=Plane(origin=(43.662831951, -6, 1.349647934), z_dir=(0, -1, 0)), keep=Keep.TOP, mode=Mode.PRIVATE)
    fillet_3_piece_21 = split(fillet_3_piece_21, bisect_by=Plane(origin=(43.662831951, -6.01466922, 1.349568214), z_dir=(0, 0.9999409315100345, 0.01086892316858739)), keep=Keep.TOP, mode=Mode.PRIVATE)
    add(fillet_3_piece_21)
    with BuildSketch(Plane(origin=(45.141316474, -6, 0), x_dir=(-1, 0, 0), z_dir=(0, 1, 0))) as fillet_3_piece_22_section:
        with BuildLine():
            CenterArc((FILLET_3_R * 1.90418183162, FILLET_3_R), FILLET_3_R, 145.413311576, 124.586688424)
            Line((FILLET_3_R * 1.08091355769, FILLET_3_R * 1.56765248977), (FILLET_3_R * 1.06444819221, FILLET_3_R * 1.57900553956))
            Line((FILLET_3_R * 1.06444819221, FILLET_3_R * 1.57900553956), (-FILLET_3_R * 0.0164653654786, FILLET_3_R * 0.0113530497954))
            Line((-FILLET_3_R * 0.0164653654786, FILLET_3_R * 0.0113530497954), (0, -FILLET_3_R * 0.02))
            Line((0, -FILLET_3_R * 0.02), (FILLET_3_R * 1.90418183162, -FILLET_3_R * 0.02))
            Line((FILLET_3_R * 1.90418183162, -FILLET_3_R * 0.02), (FILLET_3_R * 1.90418183162, 0))
        make_face()
    fillet_3_piece_22 = extrude(amount=12.521086374, mode=Mode.PRIVATE)
    fillet_3_piece_22 = split(fillet_3_piece_22, bisect_by=Plane(origin=(43.652851134, -3.008478327, 0.79630992), z_dir=(0, -0.9999409315100345, -0.010868923168587516)), keep=Keep.TOP, mode=Mode.PRIVATE)
    add(fillet_3_piece_22)
    with BuildSketch(Plane(origin=(45.141316474, -6, 0), x_dir=(-1, 0, 0), z_dir=(0, 1, 0))) as fillet_3_piece_23_section:
        with BuildLine():
            CenterArc((FILLET_3_R * 1.90418183162, FILLET_3_R), FILLET_3_R, 145.413311576, 124.586688424)
            Line((FILLET_3_R * 1.08091355769, FILLET_3_R * 1.56765248977), (FILLET_3_R * 1.06444819221, FILLET_3_R * 1.57900553956))
            Line((FILLET_3_R * 1.06444819221, FILLET_3_R * 1.57900553956), (-FILLET_3_R * 0.0164653654786, FILLET_3_R * 0.0113530497954))
            Line((-FILLET_3_R * 0.0164653654786, FILLET_3_R * 0.0113530497954), (0, -FILLET_3_R * 0.02))
            Line((0, -FILLET_3_R * 0.02), (FILLET_3_R * 1.90418183162, -FILLET_3_R * 0.02))
            Line((FILLET_3_R * 1.90418183162, -FILLET_3_R * 0.02), (FILLET_3_R * 1.90418183162, 0))
        make_face()
    fillet_3_piece_23 = extrude(amount=12.521086374, mode=Mode.PRIVATE)
    fillet_3_piece_23 = split(fillet_3_piece_23, bisect_by=Plane(origin=(43.240638921, -5.999710295, -0.026652857), z_dir=(0, -0.9999409315100345, -0.01086892316858739)), keep=Keep.TOP, mode=Mode.PRIVATE)
    add(fillet_3_piece_23)
    with BuildSketch(Plane(origin=(45.141316474, -6, 0), x_dir=(-1, 0, 0), z_dir=(0, 1, 0))) as fillet_3_piece_24_section:
        with BuildLine():
            CenterArc((FILLET_3_R * 1.90418183162, FILLET_3_R), FILLET_3_R, 145.413311576, 124.586688424)
            Line((FILLET_3_R * 1.08091355769, FILLET_3_R * 1.56765248977), (FILLET_3_R * 1.06444819221, FILLET_3_R * 1.57900553956))
            Line((FILLET_3_R * 1.06444819221, FILLET_3_R * 1.57900553956), (-FILLET_3_R * 0.0164653654786, FILLET_3_R * 0.0113530497954))
            Line((-FILLET_3_R * 0.0164653654786, FILLET_3_R * 0.0113530497954), (0, -FILLET_3_R * 0.02))
            Line((0, -FILLET_3_R * 0.02), (FILLET_3_R * 1.90418183162, -FILLET_3_R * 0.02))
            Line((FILLET_3_R * 1.90418183162, -FILLET_3_R * 0.02), (FILLET_3_R * 1.90418183162, 0))
        make_face()
    fillet_3_piece_24 = extrude(amount=12.521086374, mode=Mode.PRIVATE)
    fillet_3_piece_24 = split(fillet_3_piece_24, bisect_by=Plane(origin=(43.652851134, 6, 0.780052661), z_dir=(0, -1, 0)), keep=Keep.TOP, mode=Mode.PRIVATE)
    fillet_3_piece_24 = split(fillet_3_piece_24, bisect_by=Plane(origin=(43.652851134, 3.008478327, 0.79630992), z_dir=(0, 0.9999409315100345, -0.01086892316858714)), keep=Keep.TOP, mode=Mode.PRIVATE)
    add(fillet_3_piece_24)
    with BuildSketch(Plane(origin=(45.141316474, -6, 0), x_dir=(-1, 0, 0), z_dir=(0, 1, 0))) as fillet_3_piece_25_section:
        with BuildLine():
            CenterArc((FILLET_3_R * 1.90418183162, FILLET_3_R), FILLET_3_R, 145.413311576, 124.586688424)
            Line((FILLET_3_R * 1.08091355769, FILLET_3_R * 1.56765248977), (FILLET_3_R * 1.06444819221, FILLET_3_R * 1.57900553956))
            Line((FILLET_3_R * 1.06444819221, FILLET_3_R * 1.57900553956), (-FILLET_3_R * 0.0164653654786, FILLET_3_R * 0.0113530497954))
            Line((-FILLET_3_R * 0.0164653654786, FILLET_3_R * 0.0113530497954), (0, -FILLET_3_R * 0.02))
            Line((0, -FILLET_3_R * 0.02), (FILLET_3_R * 1.90418183162, -FILLET_3_R * 0.02))
            Line((FILLET_3_R * 1.90418183162, -FILLET_3_R * 0.02), (FILLET_3_R * 1.90418183162, 0))
        make_face()
    fillet_3_piece_25 = extrude(amount=12.521086374, mode=Mode.PRIVATE)
    fillet_3_piece_25 = split(fillet_3_piece_25, bisect_by=Plane(origin=(43.662831951, 6, 1.349647934), z_dir=(0, 1, 0)), keep=Keep.TOP, mode=Mode.PRIVATE)
    fillet_3_piece_25 = split(fillet_3_piece_25, bisect_by=Plane(origin=(43.662831951, 6.01466922, 1.349568214), z_dir=(0, -0.9999409315100345, 0.010868923168587275)), keep=Keep.TOP, mode=Mode.PRIVATE)
    add(fillet_3_piece_25)
    with BuildSketch(Plane(origin=(45.141316474, -6, 0), x_dir=(-1, 0, 0), z_dir=(0, 1, 0))) as fillet_3_piece_26_section:
        with BuildLine():
            CenterArc((FILLET_3_R * 1.90418183162, FILLET_3_R), FILLET_3_R, 145.413311576, 124.586688424)
            Line((FILLET_3_R * 1.08091355769, FILLET_3_R * 1.56765248977), (FILLET_3_R * 1.06444819221, FILLET_3_R * 1.57900553956))
            Line((FILLET_3_R * 1.06444819221, FILLET_3_R * 1.57900553956), (-FILLET_3_R * 0.0164653654786, FILLET_3_R * 0.0113530497954))
            Line((-FILLET_3_R * 0.0164653654786, FILLET_3_R * 0.0113530497954), (0, -FILLET_3_R * 0.02))
            Line((0, -FILLET_3_R * 0.02), (FILLET_3_R * 1.90418183162, -FILLET_3_R * 0.02))
            Line((FILLET_3_R * 1.90418183162, -FILLET_3_R * 0.02), (FILLET_3_R * 1.90418183162, 0))
        make_face()
    fillet_3_piece_26 = extrude(amount=12.521086374, mode=Mode.PRIVATE)
    fillet_3_piece_26 = split(fillet_3_piece_26, bisect_by=Plane(origin=(43.240638921, 6, -0.026654432), z_dir=(0, -1, 0)), keep=Keep.TOP, mode=Mode.PRIVATE)
    fillet_3_piece_26 = split(fillet_3_piece_26, bisect_by=Plane(origin=(43.240638921, 5.999710295, -0.026652857), z_dir=(0, 0.9999409315100345, -0.010868923168587275)), keep=Keep.TOP, mode=Mode.PRIVATE)
    add(fillet_3_piece_26)

    # 圆角4
    fillet_4_edges = [part.edges().sort_by_distance(p)[0] for p in [
        (42.101361871, 4.624426836, 11.45542087),
        (42.101361871, -4.624426836, 11.45542087),
        (33.361948293, 5.356956207, 78.848122968),
        (33.361948293, -5.356956207, 78.848122968),
    ]]
    fillet(fillet_4_edges, radius=FILLET_4_R)

    # 圆角5
    fillet_5_edges = [part.edges().sort_by_distance(p)[0] for p in [
        (44.585265539, 4.585270166, 7.853007208),
        (44.585265539, -4.585270166, 7.853007208),
    ]]
    fillet(fillet_5_edges, radius=FILLET_5_R)

    # 草图22 → 切除-拉伸10 (cut, two sides: drawn at the far end of the back side and taken through both)
    with BuildSketch(Plane.XZ.offset(6).offset(-CUT_EXTRUDE_10_DEPTH_BACK)):
        with Locations((34.517846697, 49.92726778)):
            Rectangle(SKETCH_22_W, SKETCH_22_H)
    extrude(amount=CUT_EXTRUDE_10_DEPTH + CUT_EXTRUDE_10_DEPTH_BACK, mode=Mode.SUBTRACT)

    # 草图24 → 切除-拉伸11 (cut)
    with BuildSketch(Plane.XY):
        with Locations((32.5, 0)):
            Rectangle(SKETCH_24_W, SKETCH_24_H)
    extrude(amount=-CUT_EXTRUDE_11_DEPTH, mode=Mode.SUBTRACT)

    # 草图25 → 切除-拉伸12 (cut)
    with BuildSketch(Plane(origin=(0, 6, 0), x_dir=(1, 0, 0), z_dir=(0, 1, 0))):
        with Locations(Location((18, 2, 0), (0, 0, 180))):
            Circle(SKETCH_25_R)
        with Locations(Location((47, 2, 0), (0, 0, 180))):
            Circle(SKETCH_25_R)
    extrude(amount=-CUT_EXTRUDE_12_DEPTH, mode=Mode.SUBTRACT)

    # 镜向2: part across plane


with BuildPart() as part_1:
    add(part.part)
    add(part.part.mirror(Plane(origin=(50, -6, -5), x_dir=(0, 0, 1), z_dir=(1, 0, 0))))

    # 草图27 → 凸台-拉伸7 (add)
    with BuildSketch(Plane.XY.offset(-2)):
        with Locations((26.315, 2.5)):
            Circle(SKETCH_27_R)
        with Locations((26.315, -2.5)):
            Circle(SKETCH_27_R)
        with Locations((73.685, 2.5)):
            Circle(SKETCH_27_R)
        with Locations((73.685, -2.5)):
            Circle(SKETCH_27_R)
    extrude(amount=-EXTRUDE_7_DEPTH)

    # 草图28 → 切除-拉伸13 (cut)
    with BuildSketch(Plane.XY.offset(-2)):
        with Locations((23.685, 2.5)):
            Circle(SKETCH_28_R)
        with Locations((23.685, -2.5)):
            Circle(SKETCH_28_R)
        with Locations((76.315, -2.5)):
            Circle(SKETCH_28_R)
        with Locations((76.315, 2.5)):
            Circle(SKETCH_28_R)
    extrude(amount=-CUT_EXTRUDE_13_DEPTH, mode=Mode.SUBTRACT)


solid = part_1.part
